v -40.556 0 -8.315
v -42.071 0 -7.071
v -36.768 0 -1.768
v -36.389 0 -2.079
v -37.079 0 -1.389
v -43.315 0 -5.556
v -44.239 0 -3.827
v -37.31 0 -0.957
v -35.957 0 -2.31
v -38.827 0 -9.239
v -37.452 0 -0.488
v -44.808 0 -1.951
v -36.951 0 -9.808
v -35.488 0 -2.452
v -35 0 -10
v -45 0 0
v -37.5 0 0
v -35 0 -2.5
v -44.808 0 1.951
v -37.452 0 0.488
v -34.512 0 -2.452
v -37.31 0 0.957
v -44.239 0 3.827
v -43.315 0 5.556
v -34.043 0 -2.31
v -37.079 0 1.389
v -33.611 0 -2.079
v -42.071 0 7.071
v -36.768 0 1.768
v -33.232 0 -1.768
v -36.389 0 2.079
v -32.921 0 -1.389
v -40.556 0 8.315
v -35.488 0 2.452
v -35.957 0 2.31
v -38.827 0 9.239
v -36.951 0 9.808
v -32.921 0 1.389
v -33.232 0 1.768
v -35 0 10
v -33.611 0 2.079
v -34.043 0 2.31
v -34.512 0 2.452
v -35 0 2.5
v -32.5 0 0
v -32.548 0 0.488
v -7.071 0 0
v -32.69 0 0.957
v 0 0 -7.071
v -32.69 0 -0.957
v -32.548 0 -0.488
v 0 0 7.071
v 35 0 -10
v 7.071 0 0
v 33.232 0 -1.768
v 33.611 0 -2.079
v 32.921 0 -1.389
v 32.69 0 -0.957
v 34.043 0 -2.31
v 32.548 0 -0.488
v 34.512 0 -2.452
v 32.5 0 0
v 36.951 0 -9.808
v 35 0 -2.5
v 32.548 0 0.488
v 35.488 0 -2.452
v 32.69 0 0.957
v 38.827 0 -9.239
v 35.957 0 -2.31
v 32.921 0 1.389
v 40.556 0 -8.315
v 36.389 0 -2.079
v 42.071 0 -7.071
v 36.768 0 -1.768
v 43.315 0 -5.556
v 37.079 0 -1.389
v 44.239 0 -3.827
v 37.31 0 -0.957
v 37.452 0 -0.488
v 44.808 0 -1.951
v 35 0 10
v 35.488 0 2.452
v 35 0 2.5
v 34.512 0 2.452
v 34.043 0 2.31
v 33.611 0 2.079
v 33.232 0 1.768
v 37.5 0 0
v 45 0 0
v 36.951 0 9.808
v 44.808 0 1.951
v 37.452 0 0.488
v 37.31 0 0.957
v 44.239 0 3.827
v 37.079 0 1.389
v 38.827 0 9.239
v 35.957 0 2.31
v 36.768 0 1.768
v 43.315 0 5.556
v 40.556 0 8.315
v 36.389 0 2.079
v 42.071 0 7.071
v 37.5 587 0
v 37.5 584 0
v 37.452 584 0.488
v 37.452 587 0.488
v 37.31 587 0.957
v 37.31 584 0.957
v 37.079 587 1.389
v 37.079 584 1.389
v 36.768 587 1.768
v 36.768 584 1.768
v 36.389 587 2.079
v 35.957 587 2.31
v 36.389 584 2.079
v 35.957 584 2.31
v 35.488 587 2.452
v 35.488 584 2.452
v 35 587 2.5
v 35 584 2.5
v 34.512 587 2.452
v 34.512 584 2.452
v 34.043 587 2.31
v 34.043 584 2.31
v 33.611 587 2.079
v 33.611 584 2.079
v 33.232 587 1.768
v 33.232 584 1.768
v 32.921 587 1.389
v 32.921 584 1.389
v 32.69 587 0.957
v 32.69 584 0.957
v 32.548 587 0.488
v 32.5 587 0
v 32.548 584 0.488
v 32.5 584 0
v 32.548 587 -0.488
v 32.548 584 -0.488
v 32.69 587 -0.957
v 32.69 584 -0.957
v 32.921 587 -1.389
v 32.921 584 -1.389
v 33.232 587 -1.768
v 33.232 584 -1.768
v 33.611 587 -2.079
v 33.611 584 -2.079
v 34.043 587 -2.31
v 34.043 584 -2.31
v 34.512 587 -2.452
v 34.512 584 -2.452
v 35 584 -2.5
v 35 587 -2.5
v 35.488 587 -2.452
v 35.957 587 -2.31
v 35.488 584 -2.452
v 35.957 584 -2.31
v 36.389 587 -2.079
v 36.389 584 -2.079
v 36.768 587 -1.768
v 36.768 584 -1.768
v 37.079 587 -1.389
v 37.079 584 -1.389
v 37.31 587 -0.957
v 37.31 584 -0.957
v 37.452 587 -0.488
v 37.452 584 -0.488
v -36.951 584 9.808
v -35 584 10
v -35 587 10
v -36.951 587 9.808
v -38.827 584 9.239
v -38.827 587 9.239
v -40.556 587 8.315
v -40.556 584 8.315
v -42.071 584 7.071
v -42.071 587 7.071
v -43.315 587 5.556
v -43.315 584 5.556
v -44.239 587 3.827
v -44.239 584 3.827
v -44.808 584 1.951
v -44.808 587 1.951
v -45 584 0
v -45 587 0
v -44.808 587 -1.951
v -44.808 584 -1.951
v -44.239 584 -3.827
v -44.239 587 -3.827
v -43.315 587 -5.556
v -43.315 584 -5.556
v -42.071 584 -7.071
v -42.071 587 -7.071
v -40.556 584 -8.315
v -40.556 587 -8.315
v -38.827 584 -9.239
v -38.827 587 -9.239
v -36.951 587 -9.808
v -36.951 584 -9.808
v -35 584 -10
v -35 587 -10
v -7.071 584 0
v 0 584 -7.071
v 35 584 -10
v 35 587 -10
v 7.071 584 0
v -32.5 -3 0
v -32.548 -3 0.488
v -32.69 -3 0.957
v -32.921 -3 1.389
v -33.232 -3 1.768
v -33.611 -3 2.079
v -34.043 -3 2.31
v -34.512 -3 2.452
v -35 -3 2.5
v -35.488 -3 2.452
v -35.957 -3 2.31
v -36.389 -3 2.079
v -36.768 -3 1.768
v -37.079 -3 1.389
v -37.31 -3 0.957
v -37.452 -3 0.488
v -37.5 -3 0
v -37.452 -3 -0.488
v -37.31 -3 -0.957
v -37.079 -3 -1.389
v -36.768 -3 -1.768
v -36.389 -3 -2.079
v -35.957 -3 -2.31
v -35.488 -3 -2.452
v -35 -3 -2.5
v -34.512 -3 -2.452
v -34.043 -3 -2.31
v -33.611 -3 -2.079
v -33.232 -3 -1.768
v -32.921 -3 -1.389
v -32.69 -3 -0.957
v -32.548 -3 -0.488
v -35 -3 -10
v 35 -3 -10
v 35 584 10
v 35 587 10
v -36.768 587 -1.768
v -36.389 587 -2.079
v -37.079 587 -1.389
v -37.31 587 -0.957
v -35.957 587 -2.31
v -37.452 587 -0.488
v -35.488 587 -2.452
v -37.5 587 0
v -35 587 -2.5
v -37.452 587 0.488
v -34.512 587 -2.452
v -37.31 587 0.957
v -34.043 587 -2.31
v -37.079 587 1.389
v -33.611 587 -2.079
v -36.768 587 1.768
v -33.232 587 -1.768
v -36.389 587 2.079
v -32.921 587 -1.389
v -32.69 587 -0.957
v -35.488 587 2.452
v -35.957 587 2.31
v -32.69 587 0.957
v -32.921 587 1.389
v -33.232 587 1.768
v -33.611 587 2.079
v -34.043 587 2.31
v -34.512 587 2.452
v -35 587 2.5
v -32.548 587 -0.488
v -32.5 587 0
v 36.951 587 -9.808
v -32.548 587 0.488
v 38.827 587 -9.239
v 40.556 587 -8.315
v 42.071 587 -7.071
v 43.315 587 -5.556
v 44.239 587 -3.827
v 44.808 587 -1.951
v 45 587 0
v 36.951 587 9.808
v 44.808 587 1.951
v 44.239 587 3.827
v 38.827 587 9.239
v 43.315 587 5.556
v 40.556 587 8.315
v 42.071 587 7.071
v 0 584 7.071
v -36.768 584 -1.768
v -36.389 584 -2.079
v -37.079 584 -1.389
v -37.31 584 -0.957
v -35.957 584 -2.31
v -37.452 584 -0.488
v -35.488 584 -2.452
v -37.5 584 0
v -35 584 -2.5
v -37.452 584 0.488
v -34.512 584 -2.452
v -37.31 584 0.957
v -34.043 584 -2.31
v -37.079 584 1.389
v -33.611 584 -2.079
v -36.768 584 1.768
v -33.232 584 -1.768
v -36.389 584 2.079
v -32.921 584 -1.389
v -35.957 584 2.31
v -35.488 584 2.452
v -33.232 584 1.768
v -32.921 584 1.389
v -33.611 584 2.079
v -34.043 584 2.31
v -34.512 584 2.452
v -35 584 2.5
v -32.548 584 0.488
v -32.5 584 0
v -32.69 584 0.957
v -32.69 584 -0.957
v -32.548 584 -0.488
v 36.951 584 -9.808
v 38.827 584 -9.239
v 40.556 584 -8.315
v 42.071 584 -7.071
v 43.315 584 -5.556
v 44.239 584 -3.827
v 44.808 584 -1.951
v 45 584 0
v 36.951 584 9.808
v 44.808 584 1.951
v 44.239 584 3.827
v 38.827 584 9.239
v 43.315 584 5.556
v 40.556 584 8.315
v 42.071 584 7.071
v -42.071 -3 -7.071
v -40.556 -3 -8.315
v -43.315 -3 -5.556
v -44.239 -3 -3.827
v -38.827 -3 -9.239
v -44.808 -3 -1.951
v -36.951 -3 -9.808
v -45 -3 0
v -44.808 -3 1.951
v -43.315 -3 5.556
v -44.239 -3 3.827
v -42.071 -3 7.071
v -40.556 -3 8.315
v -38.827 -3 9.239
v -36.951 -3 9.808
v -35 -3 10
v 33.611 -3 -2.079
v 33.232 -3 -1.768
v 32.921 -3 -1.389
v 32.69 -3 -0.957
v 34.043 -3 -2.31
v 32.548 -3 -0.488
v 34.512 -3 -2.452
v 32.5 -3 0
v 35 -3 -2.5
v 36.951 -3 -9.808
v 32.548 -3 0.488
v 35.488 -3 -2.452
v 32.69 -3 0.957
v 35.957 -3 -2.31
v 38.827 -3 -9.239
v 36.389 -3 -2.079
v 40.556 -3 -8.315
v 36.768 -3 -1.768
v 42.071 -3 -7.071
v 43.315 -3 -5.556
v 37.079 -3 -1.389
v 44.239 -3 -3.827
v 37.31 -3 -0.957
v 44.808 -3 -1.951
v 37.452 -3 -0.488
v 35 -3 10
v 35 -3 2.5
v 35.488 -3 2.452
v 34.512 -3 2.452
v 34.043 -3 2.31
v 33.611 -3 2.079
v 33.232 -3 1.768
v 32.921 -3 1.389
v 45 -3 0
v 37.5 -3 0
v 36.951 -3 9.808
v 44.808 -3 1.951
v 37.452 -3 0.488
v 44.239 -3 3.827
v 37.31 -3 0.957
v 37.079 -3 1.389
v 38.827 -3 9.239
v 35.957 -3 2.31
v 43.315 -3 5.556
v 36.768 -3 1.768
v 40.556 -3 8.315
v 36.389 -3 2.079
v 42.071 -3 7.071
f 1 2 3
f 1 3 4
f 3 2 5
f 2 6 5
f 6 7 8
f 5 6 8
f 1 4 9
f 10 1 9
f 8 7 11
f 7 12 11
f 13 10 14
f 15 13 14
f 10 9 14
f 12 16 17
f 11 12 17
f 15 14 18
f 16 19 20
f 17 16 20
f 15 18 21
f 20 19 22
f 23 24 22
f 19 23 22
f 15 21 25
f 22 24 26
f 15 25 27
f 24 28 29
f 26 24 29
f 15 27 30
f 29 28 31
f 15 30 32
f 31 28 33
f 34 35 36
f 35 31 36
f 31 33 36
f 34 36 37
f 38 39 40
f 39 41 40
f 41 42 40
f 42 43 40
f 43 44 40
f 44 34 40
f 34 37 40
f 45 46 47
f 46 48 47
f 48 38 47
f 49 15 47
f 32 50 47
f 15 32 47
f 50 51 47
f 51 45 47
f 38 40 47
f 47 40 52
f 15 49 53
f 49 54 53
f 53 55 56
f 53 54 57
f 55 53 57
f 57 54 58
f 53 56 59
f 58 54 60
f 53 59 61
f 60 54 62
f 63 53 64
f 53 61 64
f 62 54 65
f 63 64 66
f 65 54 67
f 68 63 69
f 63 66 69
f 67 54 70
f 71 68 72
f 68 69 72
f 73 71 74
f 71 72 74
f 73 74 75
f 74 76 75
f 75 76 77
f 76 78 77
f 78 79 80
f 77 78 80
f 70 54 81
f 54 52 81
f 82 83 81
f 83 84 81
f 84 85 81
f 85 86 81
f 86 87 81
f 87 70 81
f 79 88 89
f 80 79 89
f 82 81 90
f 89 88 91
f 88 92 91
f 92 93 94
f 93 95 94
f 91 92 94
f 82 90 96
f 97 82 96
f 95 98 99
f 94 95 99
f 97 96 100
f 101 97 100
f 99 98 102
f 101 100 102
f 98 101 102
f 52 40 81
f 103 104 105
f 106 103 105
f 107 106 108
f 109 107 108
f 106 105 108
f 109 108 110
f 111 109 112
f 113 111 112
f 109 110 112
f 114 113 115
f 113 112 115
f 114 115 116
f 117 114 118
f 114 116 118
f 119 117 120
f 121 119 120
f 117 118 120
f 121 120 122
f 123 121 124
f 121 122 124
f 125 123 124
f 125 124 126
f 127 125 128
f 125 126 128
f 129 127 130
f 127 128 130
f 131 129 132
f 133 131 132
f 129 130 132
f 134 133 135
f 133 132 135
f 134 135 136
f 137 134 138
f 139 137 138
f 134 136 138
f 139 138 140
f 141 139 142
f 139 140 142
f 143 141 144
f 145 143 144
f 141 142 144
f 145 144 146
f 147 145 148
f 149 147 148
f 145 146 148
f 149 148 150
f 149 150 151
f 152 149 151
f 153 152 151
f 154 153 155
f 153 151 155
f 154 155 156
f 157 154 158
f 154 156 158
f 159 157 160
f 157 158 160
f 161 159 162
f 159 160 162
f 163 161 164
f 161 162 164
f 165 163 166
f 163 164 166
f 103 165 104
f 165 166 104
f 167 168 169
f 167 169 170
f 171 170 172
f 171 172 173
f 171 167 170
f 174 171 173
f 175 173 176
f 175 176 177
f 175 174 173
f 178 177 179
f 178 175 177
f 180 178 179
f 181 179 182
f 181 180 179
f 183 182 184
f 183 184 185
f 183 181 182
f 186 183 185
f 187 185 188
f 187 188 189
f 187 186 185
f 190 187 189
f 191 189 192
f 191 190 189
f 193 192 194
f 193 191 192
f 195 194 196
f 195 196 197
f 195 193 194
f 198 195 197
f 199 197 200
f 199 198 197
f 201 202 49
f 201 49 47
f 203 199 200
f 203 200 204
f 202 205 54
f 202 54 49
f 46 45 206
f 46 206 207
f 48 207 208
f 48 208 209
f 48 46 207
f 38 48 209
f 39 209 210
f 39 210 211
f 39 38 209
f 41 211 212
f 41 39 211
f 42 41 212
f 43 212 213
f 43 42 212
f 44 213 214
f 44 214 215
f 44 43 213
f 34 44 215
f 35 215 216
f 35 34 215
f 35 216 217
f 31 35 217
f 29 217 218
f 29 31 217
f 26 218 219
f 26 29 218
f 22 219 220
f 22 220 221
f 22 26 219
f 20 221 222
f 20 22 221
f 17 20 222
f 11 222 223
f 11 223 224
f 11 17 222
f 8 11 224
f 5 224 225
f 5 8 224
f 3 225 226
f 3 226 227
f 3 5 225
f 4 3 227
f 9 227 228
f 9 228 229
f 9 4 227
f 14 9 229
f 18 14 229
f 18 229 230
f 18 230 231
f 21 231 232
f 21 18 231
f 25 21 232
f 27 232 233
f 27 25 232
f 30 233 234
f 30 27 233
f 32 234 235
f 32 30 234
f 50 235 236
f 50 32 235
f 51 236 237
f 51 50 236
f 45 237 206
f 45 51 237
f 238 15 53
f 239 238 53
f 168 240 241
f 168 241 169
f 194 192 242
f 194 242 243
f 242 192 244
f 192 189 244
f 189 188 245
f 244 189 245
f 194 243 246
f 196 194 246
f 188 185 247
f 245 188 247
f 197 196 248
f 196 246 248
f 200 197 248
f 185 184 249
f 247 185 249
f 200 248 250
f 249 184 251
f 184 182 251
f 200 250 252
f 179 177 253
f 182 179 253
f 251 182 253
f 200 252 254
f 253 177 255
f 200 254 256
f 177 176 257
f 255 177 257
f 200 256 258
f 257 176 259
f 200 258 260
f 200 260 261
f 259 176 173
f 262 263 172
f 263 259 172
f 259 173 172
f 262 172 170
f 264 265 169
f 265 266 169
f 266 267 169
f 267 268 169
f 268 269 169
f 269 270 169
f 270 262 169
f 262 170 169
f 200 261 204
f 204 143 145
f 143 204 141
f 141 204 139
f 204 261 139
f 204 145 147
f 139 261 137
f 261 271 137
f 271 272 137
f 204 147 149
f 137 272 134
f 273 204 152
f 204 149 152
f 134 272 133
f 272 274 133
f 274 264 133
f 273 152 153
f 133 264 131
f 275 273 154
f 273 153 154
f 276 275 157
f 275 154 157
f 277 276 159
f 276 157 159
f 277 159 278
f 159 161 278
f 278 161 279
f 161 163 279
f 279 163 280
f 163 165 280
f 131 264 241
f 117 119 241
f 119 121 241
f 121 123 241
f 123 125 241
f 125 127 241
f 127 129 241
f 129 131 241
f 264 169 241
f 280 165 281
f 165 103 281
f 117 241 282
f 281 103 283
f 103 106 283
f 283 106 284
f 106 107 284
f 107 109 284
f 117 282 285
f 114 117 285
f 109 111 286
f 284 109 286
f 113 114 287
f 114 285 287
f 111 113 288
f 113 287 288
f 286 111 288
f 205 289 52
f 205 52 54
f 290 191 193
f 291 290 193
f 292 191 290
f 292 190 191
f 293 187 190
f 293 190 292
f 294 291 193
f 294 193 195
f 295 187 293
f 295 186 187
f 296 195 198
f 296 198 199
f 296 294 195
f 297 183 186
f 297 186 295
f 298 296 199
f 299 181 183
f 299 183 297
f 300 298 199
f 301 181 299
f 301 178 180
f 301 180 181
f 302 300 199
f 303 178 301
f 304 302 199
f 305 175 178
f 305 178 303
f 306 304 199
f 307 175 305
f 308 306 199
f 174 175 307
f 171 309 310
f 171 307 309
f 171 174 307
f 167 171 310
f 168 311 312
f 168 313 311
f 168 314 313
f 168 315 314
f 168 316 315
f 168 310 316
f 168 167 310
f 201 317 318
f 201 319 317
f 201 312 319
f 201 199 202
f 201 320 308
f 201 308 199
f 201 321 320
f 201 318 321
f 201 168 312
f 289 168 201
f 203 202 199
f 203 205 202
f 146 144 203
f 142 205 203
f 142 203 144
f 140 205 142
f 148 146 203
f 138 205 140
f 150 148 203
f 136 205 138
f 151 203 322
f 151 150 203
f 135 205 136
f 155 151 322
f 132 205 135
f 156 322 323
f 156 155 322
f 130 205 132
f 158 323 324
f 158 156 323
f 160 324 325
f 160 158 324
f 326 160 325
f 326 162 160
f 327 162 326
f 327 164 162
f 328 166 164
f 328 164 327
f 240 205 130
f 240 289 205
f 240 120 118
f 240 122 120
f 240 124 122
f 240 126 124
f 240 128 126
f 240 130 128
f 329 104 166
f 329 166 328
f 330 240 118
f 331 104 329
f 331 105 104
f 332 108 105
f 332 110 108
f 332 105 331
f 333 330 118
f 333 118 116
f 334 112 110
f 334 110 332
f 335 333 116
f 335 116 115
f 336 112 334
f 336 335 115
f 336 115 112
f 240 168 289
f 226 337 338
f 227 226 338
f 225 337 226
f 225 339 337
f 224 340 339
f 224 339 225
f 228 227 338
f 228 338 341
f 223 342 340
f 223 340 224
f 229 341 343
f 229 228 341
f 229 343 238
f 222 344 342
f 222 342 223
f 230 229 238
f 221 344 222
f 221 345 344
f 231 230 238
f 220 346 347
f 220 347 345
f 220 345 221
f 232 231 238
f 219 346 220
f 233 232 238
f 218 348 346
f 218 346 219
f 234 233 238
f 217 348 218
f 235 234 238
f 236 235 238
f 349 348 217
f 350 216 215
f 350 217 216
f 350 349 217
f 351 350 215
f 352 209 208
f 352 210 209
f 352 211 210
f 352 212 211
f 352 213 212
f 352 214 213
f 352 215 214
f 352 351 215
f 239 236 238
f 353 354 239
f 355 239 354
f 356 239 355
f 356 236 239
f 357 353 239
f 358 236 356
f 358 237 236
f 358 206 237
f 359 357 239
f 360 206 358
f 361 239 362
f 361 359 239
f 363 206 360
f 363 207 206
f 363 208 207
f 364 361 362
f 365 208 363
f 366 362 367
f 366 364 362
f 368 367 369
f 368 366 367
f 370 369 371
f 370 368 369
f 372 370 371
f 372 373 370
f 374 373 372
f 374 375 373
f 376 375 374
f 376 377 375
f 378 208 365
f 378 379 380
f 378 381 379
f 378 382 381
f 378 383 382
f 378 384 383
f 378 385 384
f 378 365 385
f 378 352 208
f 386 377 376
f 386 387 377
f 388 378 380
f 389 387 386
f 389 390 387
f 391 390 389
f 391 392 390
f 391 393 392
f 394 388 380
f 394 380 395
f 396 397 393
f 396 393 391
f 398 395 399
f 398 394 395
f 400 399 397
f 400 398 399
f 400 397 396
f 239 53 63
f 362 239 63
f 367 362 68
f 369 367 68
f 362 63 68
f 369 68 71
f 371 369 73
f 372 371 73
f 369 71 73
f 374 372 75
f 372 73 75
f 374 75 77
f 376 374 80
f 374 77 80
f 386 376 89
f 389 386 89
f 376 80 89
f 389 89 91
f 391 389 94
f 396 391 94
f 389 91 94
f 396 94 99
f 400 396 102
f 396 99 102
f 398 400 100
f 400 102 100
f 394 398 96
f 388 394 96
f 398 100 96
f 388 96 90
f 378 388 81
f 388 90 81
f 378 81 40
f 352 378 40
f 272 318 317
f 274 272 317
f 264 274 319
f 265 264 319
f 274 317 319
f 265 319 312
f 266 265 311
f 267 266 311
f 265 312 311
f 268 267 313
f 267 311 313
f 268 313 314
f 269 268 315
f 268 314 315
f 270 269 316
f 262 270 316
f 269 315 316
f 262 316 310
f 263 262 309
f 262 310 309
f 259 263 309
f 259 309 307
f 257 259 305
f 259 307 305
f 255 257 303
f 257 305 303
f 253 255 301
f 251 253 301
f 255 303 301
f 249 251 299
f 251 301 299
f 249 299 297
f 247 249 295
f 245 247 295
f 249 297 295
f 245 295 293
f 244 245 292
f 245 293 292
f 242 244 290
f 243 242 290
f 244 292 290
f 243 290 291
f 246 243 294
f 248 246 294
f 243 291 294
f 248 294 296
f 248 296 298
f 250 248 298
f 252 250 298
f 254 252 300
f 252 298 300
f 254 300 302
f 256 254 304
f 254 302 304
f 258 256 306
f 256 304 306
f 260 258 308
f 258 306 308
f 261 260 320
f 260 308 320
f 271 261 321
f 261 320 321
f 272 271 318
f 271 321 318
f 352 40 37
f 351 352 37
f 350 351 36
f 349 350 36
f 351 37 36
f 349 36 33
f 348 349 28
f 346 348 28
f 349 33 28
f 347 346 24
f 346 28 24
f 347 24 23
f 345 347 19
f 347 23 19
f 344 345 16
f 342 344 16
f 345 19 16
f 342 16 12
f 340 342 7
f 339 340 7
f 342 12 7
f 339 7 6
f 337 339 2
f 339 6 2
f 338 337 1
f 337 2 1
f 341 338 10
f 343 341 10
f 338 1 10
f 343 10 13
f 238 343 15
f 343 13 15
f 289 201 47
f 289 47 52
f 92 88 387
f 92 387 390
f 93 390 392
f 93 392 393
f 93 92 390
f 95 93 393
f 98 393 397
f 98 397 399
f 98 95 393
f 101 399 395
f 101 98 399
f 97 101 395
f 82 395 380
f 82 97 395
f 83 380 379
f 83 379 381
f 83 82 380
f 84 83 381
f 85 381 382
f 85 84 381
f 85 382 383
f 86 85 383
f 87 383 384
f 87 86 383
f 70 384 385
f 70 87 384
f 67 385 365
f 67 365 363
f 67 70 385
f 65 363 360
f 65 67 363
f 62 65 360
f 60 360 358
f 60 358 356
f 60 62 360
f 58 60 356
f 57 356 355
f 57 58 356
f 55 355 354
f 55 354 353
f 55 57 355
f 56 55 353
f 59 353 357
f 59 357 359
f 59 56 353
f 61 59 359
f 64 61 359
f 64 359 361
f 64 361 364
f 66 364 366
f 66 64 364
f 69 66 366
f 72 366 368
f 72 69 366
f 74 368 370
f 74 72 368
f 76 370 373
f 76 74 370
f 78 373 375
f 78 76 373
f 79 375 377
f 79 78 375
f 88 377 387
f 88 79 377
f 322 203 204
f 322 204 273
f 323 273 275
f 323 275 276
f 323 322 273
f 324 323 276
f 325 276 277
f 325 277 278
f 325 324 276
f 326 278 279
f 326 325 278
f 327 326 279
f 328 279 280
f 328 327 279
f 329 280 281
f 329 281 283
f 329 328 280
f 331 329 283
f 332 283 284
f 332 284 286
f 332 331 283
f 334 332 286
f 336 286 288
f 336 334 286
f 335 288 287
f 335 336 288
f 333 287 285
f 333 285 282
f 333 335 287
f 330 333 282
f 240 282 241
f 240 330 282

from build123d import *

# Parameters (mm, degrees)
F1_R     = 2.5
F2_DEPTH = 3
F4_DEPTH = 292


with BuildPart() as f2:
    # F1 (on Front) → F2 (new body)
    with BuildSketch(Plane.XZ):
        with BuildLine():
            ThreePointArc((35, -10), (45, 0), (35, 10))
            Line((35, 10), (0, 10))
            Line((0, 10), (-35, 10))
            ThreePointArc((-35, 10), (-45, 0), (-35, -10))
            Line((-35, -10), (0, -10))
            Line((0, -10), (35, -10))
        make_face()
        with Locations((-35, 0)):
            Circle(F1_R, mode=Mode.SUBTRACT)
        with Locations((35, 0)):
            Circle(F1_R, mode=Mode.SUBTRACT)
    extrude(amount=F2_DEPTH)

    # F3 (on face) → F4 (join, through all)
    with BuildSketch(Plane(origin=(0, 0, 0), x_dir=(-1, 0, 0), z_dir=(0, 1, 0))):
        Polygon((7.071068, 0), (0, 7.071068), (-7.071068, 0), (0, -7.071068), align=None)
    extrude(amount=F4_DEPTH)

    # F5: F2 across plane


with BuildPart() as f2_1:
    add(f2.part)
    add(f2.part.mirror(Plane.XZ.offset(-292)))


solid = f2_1.part
